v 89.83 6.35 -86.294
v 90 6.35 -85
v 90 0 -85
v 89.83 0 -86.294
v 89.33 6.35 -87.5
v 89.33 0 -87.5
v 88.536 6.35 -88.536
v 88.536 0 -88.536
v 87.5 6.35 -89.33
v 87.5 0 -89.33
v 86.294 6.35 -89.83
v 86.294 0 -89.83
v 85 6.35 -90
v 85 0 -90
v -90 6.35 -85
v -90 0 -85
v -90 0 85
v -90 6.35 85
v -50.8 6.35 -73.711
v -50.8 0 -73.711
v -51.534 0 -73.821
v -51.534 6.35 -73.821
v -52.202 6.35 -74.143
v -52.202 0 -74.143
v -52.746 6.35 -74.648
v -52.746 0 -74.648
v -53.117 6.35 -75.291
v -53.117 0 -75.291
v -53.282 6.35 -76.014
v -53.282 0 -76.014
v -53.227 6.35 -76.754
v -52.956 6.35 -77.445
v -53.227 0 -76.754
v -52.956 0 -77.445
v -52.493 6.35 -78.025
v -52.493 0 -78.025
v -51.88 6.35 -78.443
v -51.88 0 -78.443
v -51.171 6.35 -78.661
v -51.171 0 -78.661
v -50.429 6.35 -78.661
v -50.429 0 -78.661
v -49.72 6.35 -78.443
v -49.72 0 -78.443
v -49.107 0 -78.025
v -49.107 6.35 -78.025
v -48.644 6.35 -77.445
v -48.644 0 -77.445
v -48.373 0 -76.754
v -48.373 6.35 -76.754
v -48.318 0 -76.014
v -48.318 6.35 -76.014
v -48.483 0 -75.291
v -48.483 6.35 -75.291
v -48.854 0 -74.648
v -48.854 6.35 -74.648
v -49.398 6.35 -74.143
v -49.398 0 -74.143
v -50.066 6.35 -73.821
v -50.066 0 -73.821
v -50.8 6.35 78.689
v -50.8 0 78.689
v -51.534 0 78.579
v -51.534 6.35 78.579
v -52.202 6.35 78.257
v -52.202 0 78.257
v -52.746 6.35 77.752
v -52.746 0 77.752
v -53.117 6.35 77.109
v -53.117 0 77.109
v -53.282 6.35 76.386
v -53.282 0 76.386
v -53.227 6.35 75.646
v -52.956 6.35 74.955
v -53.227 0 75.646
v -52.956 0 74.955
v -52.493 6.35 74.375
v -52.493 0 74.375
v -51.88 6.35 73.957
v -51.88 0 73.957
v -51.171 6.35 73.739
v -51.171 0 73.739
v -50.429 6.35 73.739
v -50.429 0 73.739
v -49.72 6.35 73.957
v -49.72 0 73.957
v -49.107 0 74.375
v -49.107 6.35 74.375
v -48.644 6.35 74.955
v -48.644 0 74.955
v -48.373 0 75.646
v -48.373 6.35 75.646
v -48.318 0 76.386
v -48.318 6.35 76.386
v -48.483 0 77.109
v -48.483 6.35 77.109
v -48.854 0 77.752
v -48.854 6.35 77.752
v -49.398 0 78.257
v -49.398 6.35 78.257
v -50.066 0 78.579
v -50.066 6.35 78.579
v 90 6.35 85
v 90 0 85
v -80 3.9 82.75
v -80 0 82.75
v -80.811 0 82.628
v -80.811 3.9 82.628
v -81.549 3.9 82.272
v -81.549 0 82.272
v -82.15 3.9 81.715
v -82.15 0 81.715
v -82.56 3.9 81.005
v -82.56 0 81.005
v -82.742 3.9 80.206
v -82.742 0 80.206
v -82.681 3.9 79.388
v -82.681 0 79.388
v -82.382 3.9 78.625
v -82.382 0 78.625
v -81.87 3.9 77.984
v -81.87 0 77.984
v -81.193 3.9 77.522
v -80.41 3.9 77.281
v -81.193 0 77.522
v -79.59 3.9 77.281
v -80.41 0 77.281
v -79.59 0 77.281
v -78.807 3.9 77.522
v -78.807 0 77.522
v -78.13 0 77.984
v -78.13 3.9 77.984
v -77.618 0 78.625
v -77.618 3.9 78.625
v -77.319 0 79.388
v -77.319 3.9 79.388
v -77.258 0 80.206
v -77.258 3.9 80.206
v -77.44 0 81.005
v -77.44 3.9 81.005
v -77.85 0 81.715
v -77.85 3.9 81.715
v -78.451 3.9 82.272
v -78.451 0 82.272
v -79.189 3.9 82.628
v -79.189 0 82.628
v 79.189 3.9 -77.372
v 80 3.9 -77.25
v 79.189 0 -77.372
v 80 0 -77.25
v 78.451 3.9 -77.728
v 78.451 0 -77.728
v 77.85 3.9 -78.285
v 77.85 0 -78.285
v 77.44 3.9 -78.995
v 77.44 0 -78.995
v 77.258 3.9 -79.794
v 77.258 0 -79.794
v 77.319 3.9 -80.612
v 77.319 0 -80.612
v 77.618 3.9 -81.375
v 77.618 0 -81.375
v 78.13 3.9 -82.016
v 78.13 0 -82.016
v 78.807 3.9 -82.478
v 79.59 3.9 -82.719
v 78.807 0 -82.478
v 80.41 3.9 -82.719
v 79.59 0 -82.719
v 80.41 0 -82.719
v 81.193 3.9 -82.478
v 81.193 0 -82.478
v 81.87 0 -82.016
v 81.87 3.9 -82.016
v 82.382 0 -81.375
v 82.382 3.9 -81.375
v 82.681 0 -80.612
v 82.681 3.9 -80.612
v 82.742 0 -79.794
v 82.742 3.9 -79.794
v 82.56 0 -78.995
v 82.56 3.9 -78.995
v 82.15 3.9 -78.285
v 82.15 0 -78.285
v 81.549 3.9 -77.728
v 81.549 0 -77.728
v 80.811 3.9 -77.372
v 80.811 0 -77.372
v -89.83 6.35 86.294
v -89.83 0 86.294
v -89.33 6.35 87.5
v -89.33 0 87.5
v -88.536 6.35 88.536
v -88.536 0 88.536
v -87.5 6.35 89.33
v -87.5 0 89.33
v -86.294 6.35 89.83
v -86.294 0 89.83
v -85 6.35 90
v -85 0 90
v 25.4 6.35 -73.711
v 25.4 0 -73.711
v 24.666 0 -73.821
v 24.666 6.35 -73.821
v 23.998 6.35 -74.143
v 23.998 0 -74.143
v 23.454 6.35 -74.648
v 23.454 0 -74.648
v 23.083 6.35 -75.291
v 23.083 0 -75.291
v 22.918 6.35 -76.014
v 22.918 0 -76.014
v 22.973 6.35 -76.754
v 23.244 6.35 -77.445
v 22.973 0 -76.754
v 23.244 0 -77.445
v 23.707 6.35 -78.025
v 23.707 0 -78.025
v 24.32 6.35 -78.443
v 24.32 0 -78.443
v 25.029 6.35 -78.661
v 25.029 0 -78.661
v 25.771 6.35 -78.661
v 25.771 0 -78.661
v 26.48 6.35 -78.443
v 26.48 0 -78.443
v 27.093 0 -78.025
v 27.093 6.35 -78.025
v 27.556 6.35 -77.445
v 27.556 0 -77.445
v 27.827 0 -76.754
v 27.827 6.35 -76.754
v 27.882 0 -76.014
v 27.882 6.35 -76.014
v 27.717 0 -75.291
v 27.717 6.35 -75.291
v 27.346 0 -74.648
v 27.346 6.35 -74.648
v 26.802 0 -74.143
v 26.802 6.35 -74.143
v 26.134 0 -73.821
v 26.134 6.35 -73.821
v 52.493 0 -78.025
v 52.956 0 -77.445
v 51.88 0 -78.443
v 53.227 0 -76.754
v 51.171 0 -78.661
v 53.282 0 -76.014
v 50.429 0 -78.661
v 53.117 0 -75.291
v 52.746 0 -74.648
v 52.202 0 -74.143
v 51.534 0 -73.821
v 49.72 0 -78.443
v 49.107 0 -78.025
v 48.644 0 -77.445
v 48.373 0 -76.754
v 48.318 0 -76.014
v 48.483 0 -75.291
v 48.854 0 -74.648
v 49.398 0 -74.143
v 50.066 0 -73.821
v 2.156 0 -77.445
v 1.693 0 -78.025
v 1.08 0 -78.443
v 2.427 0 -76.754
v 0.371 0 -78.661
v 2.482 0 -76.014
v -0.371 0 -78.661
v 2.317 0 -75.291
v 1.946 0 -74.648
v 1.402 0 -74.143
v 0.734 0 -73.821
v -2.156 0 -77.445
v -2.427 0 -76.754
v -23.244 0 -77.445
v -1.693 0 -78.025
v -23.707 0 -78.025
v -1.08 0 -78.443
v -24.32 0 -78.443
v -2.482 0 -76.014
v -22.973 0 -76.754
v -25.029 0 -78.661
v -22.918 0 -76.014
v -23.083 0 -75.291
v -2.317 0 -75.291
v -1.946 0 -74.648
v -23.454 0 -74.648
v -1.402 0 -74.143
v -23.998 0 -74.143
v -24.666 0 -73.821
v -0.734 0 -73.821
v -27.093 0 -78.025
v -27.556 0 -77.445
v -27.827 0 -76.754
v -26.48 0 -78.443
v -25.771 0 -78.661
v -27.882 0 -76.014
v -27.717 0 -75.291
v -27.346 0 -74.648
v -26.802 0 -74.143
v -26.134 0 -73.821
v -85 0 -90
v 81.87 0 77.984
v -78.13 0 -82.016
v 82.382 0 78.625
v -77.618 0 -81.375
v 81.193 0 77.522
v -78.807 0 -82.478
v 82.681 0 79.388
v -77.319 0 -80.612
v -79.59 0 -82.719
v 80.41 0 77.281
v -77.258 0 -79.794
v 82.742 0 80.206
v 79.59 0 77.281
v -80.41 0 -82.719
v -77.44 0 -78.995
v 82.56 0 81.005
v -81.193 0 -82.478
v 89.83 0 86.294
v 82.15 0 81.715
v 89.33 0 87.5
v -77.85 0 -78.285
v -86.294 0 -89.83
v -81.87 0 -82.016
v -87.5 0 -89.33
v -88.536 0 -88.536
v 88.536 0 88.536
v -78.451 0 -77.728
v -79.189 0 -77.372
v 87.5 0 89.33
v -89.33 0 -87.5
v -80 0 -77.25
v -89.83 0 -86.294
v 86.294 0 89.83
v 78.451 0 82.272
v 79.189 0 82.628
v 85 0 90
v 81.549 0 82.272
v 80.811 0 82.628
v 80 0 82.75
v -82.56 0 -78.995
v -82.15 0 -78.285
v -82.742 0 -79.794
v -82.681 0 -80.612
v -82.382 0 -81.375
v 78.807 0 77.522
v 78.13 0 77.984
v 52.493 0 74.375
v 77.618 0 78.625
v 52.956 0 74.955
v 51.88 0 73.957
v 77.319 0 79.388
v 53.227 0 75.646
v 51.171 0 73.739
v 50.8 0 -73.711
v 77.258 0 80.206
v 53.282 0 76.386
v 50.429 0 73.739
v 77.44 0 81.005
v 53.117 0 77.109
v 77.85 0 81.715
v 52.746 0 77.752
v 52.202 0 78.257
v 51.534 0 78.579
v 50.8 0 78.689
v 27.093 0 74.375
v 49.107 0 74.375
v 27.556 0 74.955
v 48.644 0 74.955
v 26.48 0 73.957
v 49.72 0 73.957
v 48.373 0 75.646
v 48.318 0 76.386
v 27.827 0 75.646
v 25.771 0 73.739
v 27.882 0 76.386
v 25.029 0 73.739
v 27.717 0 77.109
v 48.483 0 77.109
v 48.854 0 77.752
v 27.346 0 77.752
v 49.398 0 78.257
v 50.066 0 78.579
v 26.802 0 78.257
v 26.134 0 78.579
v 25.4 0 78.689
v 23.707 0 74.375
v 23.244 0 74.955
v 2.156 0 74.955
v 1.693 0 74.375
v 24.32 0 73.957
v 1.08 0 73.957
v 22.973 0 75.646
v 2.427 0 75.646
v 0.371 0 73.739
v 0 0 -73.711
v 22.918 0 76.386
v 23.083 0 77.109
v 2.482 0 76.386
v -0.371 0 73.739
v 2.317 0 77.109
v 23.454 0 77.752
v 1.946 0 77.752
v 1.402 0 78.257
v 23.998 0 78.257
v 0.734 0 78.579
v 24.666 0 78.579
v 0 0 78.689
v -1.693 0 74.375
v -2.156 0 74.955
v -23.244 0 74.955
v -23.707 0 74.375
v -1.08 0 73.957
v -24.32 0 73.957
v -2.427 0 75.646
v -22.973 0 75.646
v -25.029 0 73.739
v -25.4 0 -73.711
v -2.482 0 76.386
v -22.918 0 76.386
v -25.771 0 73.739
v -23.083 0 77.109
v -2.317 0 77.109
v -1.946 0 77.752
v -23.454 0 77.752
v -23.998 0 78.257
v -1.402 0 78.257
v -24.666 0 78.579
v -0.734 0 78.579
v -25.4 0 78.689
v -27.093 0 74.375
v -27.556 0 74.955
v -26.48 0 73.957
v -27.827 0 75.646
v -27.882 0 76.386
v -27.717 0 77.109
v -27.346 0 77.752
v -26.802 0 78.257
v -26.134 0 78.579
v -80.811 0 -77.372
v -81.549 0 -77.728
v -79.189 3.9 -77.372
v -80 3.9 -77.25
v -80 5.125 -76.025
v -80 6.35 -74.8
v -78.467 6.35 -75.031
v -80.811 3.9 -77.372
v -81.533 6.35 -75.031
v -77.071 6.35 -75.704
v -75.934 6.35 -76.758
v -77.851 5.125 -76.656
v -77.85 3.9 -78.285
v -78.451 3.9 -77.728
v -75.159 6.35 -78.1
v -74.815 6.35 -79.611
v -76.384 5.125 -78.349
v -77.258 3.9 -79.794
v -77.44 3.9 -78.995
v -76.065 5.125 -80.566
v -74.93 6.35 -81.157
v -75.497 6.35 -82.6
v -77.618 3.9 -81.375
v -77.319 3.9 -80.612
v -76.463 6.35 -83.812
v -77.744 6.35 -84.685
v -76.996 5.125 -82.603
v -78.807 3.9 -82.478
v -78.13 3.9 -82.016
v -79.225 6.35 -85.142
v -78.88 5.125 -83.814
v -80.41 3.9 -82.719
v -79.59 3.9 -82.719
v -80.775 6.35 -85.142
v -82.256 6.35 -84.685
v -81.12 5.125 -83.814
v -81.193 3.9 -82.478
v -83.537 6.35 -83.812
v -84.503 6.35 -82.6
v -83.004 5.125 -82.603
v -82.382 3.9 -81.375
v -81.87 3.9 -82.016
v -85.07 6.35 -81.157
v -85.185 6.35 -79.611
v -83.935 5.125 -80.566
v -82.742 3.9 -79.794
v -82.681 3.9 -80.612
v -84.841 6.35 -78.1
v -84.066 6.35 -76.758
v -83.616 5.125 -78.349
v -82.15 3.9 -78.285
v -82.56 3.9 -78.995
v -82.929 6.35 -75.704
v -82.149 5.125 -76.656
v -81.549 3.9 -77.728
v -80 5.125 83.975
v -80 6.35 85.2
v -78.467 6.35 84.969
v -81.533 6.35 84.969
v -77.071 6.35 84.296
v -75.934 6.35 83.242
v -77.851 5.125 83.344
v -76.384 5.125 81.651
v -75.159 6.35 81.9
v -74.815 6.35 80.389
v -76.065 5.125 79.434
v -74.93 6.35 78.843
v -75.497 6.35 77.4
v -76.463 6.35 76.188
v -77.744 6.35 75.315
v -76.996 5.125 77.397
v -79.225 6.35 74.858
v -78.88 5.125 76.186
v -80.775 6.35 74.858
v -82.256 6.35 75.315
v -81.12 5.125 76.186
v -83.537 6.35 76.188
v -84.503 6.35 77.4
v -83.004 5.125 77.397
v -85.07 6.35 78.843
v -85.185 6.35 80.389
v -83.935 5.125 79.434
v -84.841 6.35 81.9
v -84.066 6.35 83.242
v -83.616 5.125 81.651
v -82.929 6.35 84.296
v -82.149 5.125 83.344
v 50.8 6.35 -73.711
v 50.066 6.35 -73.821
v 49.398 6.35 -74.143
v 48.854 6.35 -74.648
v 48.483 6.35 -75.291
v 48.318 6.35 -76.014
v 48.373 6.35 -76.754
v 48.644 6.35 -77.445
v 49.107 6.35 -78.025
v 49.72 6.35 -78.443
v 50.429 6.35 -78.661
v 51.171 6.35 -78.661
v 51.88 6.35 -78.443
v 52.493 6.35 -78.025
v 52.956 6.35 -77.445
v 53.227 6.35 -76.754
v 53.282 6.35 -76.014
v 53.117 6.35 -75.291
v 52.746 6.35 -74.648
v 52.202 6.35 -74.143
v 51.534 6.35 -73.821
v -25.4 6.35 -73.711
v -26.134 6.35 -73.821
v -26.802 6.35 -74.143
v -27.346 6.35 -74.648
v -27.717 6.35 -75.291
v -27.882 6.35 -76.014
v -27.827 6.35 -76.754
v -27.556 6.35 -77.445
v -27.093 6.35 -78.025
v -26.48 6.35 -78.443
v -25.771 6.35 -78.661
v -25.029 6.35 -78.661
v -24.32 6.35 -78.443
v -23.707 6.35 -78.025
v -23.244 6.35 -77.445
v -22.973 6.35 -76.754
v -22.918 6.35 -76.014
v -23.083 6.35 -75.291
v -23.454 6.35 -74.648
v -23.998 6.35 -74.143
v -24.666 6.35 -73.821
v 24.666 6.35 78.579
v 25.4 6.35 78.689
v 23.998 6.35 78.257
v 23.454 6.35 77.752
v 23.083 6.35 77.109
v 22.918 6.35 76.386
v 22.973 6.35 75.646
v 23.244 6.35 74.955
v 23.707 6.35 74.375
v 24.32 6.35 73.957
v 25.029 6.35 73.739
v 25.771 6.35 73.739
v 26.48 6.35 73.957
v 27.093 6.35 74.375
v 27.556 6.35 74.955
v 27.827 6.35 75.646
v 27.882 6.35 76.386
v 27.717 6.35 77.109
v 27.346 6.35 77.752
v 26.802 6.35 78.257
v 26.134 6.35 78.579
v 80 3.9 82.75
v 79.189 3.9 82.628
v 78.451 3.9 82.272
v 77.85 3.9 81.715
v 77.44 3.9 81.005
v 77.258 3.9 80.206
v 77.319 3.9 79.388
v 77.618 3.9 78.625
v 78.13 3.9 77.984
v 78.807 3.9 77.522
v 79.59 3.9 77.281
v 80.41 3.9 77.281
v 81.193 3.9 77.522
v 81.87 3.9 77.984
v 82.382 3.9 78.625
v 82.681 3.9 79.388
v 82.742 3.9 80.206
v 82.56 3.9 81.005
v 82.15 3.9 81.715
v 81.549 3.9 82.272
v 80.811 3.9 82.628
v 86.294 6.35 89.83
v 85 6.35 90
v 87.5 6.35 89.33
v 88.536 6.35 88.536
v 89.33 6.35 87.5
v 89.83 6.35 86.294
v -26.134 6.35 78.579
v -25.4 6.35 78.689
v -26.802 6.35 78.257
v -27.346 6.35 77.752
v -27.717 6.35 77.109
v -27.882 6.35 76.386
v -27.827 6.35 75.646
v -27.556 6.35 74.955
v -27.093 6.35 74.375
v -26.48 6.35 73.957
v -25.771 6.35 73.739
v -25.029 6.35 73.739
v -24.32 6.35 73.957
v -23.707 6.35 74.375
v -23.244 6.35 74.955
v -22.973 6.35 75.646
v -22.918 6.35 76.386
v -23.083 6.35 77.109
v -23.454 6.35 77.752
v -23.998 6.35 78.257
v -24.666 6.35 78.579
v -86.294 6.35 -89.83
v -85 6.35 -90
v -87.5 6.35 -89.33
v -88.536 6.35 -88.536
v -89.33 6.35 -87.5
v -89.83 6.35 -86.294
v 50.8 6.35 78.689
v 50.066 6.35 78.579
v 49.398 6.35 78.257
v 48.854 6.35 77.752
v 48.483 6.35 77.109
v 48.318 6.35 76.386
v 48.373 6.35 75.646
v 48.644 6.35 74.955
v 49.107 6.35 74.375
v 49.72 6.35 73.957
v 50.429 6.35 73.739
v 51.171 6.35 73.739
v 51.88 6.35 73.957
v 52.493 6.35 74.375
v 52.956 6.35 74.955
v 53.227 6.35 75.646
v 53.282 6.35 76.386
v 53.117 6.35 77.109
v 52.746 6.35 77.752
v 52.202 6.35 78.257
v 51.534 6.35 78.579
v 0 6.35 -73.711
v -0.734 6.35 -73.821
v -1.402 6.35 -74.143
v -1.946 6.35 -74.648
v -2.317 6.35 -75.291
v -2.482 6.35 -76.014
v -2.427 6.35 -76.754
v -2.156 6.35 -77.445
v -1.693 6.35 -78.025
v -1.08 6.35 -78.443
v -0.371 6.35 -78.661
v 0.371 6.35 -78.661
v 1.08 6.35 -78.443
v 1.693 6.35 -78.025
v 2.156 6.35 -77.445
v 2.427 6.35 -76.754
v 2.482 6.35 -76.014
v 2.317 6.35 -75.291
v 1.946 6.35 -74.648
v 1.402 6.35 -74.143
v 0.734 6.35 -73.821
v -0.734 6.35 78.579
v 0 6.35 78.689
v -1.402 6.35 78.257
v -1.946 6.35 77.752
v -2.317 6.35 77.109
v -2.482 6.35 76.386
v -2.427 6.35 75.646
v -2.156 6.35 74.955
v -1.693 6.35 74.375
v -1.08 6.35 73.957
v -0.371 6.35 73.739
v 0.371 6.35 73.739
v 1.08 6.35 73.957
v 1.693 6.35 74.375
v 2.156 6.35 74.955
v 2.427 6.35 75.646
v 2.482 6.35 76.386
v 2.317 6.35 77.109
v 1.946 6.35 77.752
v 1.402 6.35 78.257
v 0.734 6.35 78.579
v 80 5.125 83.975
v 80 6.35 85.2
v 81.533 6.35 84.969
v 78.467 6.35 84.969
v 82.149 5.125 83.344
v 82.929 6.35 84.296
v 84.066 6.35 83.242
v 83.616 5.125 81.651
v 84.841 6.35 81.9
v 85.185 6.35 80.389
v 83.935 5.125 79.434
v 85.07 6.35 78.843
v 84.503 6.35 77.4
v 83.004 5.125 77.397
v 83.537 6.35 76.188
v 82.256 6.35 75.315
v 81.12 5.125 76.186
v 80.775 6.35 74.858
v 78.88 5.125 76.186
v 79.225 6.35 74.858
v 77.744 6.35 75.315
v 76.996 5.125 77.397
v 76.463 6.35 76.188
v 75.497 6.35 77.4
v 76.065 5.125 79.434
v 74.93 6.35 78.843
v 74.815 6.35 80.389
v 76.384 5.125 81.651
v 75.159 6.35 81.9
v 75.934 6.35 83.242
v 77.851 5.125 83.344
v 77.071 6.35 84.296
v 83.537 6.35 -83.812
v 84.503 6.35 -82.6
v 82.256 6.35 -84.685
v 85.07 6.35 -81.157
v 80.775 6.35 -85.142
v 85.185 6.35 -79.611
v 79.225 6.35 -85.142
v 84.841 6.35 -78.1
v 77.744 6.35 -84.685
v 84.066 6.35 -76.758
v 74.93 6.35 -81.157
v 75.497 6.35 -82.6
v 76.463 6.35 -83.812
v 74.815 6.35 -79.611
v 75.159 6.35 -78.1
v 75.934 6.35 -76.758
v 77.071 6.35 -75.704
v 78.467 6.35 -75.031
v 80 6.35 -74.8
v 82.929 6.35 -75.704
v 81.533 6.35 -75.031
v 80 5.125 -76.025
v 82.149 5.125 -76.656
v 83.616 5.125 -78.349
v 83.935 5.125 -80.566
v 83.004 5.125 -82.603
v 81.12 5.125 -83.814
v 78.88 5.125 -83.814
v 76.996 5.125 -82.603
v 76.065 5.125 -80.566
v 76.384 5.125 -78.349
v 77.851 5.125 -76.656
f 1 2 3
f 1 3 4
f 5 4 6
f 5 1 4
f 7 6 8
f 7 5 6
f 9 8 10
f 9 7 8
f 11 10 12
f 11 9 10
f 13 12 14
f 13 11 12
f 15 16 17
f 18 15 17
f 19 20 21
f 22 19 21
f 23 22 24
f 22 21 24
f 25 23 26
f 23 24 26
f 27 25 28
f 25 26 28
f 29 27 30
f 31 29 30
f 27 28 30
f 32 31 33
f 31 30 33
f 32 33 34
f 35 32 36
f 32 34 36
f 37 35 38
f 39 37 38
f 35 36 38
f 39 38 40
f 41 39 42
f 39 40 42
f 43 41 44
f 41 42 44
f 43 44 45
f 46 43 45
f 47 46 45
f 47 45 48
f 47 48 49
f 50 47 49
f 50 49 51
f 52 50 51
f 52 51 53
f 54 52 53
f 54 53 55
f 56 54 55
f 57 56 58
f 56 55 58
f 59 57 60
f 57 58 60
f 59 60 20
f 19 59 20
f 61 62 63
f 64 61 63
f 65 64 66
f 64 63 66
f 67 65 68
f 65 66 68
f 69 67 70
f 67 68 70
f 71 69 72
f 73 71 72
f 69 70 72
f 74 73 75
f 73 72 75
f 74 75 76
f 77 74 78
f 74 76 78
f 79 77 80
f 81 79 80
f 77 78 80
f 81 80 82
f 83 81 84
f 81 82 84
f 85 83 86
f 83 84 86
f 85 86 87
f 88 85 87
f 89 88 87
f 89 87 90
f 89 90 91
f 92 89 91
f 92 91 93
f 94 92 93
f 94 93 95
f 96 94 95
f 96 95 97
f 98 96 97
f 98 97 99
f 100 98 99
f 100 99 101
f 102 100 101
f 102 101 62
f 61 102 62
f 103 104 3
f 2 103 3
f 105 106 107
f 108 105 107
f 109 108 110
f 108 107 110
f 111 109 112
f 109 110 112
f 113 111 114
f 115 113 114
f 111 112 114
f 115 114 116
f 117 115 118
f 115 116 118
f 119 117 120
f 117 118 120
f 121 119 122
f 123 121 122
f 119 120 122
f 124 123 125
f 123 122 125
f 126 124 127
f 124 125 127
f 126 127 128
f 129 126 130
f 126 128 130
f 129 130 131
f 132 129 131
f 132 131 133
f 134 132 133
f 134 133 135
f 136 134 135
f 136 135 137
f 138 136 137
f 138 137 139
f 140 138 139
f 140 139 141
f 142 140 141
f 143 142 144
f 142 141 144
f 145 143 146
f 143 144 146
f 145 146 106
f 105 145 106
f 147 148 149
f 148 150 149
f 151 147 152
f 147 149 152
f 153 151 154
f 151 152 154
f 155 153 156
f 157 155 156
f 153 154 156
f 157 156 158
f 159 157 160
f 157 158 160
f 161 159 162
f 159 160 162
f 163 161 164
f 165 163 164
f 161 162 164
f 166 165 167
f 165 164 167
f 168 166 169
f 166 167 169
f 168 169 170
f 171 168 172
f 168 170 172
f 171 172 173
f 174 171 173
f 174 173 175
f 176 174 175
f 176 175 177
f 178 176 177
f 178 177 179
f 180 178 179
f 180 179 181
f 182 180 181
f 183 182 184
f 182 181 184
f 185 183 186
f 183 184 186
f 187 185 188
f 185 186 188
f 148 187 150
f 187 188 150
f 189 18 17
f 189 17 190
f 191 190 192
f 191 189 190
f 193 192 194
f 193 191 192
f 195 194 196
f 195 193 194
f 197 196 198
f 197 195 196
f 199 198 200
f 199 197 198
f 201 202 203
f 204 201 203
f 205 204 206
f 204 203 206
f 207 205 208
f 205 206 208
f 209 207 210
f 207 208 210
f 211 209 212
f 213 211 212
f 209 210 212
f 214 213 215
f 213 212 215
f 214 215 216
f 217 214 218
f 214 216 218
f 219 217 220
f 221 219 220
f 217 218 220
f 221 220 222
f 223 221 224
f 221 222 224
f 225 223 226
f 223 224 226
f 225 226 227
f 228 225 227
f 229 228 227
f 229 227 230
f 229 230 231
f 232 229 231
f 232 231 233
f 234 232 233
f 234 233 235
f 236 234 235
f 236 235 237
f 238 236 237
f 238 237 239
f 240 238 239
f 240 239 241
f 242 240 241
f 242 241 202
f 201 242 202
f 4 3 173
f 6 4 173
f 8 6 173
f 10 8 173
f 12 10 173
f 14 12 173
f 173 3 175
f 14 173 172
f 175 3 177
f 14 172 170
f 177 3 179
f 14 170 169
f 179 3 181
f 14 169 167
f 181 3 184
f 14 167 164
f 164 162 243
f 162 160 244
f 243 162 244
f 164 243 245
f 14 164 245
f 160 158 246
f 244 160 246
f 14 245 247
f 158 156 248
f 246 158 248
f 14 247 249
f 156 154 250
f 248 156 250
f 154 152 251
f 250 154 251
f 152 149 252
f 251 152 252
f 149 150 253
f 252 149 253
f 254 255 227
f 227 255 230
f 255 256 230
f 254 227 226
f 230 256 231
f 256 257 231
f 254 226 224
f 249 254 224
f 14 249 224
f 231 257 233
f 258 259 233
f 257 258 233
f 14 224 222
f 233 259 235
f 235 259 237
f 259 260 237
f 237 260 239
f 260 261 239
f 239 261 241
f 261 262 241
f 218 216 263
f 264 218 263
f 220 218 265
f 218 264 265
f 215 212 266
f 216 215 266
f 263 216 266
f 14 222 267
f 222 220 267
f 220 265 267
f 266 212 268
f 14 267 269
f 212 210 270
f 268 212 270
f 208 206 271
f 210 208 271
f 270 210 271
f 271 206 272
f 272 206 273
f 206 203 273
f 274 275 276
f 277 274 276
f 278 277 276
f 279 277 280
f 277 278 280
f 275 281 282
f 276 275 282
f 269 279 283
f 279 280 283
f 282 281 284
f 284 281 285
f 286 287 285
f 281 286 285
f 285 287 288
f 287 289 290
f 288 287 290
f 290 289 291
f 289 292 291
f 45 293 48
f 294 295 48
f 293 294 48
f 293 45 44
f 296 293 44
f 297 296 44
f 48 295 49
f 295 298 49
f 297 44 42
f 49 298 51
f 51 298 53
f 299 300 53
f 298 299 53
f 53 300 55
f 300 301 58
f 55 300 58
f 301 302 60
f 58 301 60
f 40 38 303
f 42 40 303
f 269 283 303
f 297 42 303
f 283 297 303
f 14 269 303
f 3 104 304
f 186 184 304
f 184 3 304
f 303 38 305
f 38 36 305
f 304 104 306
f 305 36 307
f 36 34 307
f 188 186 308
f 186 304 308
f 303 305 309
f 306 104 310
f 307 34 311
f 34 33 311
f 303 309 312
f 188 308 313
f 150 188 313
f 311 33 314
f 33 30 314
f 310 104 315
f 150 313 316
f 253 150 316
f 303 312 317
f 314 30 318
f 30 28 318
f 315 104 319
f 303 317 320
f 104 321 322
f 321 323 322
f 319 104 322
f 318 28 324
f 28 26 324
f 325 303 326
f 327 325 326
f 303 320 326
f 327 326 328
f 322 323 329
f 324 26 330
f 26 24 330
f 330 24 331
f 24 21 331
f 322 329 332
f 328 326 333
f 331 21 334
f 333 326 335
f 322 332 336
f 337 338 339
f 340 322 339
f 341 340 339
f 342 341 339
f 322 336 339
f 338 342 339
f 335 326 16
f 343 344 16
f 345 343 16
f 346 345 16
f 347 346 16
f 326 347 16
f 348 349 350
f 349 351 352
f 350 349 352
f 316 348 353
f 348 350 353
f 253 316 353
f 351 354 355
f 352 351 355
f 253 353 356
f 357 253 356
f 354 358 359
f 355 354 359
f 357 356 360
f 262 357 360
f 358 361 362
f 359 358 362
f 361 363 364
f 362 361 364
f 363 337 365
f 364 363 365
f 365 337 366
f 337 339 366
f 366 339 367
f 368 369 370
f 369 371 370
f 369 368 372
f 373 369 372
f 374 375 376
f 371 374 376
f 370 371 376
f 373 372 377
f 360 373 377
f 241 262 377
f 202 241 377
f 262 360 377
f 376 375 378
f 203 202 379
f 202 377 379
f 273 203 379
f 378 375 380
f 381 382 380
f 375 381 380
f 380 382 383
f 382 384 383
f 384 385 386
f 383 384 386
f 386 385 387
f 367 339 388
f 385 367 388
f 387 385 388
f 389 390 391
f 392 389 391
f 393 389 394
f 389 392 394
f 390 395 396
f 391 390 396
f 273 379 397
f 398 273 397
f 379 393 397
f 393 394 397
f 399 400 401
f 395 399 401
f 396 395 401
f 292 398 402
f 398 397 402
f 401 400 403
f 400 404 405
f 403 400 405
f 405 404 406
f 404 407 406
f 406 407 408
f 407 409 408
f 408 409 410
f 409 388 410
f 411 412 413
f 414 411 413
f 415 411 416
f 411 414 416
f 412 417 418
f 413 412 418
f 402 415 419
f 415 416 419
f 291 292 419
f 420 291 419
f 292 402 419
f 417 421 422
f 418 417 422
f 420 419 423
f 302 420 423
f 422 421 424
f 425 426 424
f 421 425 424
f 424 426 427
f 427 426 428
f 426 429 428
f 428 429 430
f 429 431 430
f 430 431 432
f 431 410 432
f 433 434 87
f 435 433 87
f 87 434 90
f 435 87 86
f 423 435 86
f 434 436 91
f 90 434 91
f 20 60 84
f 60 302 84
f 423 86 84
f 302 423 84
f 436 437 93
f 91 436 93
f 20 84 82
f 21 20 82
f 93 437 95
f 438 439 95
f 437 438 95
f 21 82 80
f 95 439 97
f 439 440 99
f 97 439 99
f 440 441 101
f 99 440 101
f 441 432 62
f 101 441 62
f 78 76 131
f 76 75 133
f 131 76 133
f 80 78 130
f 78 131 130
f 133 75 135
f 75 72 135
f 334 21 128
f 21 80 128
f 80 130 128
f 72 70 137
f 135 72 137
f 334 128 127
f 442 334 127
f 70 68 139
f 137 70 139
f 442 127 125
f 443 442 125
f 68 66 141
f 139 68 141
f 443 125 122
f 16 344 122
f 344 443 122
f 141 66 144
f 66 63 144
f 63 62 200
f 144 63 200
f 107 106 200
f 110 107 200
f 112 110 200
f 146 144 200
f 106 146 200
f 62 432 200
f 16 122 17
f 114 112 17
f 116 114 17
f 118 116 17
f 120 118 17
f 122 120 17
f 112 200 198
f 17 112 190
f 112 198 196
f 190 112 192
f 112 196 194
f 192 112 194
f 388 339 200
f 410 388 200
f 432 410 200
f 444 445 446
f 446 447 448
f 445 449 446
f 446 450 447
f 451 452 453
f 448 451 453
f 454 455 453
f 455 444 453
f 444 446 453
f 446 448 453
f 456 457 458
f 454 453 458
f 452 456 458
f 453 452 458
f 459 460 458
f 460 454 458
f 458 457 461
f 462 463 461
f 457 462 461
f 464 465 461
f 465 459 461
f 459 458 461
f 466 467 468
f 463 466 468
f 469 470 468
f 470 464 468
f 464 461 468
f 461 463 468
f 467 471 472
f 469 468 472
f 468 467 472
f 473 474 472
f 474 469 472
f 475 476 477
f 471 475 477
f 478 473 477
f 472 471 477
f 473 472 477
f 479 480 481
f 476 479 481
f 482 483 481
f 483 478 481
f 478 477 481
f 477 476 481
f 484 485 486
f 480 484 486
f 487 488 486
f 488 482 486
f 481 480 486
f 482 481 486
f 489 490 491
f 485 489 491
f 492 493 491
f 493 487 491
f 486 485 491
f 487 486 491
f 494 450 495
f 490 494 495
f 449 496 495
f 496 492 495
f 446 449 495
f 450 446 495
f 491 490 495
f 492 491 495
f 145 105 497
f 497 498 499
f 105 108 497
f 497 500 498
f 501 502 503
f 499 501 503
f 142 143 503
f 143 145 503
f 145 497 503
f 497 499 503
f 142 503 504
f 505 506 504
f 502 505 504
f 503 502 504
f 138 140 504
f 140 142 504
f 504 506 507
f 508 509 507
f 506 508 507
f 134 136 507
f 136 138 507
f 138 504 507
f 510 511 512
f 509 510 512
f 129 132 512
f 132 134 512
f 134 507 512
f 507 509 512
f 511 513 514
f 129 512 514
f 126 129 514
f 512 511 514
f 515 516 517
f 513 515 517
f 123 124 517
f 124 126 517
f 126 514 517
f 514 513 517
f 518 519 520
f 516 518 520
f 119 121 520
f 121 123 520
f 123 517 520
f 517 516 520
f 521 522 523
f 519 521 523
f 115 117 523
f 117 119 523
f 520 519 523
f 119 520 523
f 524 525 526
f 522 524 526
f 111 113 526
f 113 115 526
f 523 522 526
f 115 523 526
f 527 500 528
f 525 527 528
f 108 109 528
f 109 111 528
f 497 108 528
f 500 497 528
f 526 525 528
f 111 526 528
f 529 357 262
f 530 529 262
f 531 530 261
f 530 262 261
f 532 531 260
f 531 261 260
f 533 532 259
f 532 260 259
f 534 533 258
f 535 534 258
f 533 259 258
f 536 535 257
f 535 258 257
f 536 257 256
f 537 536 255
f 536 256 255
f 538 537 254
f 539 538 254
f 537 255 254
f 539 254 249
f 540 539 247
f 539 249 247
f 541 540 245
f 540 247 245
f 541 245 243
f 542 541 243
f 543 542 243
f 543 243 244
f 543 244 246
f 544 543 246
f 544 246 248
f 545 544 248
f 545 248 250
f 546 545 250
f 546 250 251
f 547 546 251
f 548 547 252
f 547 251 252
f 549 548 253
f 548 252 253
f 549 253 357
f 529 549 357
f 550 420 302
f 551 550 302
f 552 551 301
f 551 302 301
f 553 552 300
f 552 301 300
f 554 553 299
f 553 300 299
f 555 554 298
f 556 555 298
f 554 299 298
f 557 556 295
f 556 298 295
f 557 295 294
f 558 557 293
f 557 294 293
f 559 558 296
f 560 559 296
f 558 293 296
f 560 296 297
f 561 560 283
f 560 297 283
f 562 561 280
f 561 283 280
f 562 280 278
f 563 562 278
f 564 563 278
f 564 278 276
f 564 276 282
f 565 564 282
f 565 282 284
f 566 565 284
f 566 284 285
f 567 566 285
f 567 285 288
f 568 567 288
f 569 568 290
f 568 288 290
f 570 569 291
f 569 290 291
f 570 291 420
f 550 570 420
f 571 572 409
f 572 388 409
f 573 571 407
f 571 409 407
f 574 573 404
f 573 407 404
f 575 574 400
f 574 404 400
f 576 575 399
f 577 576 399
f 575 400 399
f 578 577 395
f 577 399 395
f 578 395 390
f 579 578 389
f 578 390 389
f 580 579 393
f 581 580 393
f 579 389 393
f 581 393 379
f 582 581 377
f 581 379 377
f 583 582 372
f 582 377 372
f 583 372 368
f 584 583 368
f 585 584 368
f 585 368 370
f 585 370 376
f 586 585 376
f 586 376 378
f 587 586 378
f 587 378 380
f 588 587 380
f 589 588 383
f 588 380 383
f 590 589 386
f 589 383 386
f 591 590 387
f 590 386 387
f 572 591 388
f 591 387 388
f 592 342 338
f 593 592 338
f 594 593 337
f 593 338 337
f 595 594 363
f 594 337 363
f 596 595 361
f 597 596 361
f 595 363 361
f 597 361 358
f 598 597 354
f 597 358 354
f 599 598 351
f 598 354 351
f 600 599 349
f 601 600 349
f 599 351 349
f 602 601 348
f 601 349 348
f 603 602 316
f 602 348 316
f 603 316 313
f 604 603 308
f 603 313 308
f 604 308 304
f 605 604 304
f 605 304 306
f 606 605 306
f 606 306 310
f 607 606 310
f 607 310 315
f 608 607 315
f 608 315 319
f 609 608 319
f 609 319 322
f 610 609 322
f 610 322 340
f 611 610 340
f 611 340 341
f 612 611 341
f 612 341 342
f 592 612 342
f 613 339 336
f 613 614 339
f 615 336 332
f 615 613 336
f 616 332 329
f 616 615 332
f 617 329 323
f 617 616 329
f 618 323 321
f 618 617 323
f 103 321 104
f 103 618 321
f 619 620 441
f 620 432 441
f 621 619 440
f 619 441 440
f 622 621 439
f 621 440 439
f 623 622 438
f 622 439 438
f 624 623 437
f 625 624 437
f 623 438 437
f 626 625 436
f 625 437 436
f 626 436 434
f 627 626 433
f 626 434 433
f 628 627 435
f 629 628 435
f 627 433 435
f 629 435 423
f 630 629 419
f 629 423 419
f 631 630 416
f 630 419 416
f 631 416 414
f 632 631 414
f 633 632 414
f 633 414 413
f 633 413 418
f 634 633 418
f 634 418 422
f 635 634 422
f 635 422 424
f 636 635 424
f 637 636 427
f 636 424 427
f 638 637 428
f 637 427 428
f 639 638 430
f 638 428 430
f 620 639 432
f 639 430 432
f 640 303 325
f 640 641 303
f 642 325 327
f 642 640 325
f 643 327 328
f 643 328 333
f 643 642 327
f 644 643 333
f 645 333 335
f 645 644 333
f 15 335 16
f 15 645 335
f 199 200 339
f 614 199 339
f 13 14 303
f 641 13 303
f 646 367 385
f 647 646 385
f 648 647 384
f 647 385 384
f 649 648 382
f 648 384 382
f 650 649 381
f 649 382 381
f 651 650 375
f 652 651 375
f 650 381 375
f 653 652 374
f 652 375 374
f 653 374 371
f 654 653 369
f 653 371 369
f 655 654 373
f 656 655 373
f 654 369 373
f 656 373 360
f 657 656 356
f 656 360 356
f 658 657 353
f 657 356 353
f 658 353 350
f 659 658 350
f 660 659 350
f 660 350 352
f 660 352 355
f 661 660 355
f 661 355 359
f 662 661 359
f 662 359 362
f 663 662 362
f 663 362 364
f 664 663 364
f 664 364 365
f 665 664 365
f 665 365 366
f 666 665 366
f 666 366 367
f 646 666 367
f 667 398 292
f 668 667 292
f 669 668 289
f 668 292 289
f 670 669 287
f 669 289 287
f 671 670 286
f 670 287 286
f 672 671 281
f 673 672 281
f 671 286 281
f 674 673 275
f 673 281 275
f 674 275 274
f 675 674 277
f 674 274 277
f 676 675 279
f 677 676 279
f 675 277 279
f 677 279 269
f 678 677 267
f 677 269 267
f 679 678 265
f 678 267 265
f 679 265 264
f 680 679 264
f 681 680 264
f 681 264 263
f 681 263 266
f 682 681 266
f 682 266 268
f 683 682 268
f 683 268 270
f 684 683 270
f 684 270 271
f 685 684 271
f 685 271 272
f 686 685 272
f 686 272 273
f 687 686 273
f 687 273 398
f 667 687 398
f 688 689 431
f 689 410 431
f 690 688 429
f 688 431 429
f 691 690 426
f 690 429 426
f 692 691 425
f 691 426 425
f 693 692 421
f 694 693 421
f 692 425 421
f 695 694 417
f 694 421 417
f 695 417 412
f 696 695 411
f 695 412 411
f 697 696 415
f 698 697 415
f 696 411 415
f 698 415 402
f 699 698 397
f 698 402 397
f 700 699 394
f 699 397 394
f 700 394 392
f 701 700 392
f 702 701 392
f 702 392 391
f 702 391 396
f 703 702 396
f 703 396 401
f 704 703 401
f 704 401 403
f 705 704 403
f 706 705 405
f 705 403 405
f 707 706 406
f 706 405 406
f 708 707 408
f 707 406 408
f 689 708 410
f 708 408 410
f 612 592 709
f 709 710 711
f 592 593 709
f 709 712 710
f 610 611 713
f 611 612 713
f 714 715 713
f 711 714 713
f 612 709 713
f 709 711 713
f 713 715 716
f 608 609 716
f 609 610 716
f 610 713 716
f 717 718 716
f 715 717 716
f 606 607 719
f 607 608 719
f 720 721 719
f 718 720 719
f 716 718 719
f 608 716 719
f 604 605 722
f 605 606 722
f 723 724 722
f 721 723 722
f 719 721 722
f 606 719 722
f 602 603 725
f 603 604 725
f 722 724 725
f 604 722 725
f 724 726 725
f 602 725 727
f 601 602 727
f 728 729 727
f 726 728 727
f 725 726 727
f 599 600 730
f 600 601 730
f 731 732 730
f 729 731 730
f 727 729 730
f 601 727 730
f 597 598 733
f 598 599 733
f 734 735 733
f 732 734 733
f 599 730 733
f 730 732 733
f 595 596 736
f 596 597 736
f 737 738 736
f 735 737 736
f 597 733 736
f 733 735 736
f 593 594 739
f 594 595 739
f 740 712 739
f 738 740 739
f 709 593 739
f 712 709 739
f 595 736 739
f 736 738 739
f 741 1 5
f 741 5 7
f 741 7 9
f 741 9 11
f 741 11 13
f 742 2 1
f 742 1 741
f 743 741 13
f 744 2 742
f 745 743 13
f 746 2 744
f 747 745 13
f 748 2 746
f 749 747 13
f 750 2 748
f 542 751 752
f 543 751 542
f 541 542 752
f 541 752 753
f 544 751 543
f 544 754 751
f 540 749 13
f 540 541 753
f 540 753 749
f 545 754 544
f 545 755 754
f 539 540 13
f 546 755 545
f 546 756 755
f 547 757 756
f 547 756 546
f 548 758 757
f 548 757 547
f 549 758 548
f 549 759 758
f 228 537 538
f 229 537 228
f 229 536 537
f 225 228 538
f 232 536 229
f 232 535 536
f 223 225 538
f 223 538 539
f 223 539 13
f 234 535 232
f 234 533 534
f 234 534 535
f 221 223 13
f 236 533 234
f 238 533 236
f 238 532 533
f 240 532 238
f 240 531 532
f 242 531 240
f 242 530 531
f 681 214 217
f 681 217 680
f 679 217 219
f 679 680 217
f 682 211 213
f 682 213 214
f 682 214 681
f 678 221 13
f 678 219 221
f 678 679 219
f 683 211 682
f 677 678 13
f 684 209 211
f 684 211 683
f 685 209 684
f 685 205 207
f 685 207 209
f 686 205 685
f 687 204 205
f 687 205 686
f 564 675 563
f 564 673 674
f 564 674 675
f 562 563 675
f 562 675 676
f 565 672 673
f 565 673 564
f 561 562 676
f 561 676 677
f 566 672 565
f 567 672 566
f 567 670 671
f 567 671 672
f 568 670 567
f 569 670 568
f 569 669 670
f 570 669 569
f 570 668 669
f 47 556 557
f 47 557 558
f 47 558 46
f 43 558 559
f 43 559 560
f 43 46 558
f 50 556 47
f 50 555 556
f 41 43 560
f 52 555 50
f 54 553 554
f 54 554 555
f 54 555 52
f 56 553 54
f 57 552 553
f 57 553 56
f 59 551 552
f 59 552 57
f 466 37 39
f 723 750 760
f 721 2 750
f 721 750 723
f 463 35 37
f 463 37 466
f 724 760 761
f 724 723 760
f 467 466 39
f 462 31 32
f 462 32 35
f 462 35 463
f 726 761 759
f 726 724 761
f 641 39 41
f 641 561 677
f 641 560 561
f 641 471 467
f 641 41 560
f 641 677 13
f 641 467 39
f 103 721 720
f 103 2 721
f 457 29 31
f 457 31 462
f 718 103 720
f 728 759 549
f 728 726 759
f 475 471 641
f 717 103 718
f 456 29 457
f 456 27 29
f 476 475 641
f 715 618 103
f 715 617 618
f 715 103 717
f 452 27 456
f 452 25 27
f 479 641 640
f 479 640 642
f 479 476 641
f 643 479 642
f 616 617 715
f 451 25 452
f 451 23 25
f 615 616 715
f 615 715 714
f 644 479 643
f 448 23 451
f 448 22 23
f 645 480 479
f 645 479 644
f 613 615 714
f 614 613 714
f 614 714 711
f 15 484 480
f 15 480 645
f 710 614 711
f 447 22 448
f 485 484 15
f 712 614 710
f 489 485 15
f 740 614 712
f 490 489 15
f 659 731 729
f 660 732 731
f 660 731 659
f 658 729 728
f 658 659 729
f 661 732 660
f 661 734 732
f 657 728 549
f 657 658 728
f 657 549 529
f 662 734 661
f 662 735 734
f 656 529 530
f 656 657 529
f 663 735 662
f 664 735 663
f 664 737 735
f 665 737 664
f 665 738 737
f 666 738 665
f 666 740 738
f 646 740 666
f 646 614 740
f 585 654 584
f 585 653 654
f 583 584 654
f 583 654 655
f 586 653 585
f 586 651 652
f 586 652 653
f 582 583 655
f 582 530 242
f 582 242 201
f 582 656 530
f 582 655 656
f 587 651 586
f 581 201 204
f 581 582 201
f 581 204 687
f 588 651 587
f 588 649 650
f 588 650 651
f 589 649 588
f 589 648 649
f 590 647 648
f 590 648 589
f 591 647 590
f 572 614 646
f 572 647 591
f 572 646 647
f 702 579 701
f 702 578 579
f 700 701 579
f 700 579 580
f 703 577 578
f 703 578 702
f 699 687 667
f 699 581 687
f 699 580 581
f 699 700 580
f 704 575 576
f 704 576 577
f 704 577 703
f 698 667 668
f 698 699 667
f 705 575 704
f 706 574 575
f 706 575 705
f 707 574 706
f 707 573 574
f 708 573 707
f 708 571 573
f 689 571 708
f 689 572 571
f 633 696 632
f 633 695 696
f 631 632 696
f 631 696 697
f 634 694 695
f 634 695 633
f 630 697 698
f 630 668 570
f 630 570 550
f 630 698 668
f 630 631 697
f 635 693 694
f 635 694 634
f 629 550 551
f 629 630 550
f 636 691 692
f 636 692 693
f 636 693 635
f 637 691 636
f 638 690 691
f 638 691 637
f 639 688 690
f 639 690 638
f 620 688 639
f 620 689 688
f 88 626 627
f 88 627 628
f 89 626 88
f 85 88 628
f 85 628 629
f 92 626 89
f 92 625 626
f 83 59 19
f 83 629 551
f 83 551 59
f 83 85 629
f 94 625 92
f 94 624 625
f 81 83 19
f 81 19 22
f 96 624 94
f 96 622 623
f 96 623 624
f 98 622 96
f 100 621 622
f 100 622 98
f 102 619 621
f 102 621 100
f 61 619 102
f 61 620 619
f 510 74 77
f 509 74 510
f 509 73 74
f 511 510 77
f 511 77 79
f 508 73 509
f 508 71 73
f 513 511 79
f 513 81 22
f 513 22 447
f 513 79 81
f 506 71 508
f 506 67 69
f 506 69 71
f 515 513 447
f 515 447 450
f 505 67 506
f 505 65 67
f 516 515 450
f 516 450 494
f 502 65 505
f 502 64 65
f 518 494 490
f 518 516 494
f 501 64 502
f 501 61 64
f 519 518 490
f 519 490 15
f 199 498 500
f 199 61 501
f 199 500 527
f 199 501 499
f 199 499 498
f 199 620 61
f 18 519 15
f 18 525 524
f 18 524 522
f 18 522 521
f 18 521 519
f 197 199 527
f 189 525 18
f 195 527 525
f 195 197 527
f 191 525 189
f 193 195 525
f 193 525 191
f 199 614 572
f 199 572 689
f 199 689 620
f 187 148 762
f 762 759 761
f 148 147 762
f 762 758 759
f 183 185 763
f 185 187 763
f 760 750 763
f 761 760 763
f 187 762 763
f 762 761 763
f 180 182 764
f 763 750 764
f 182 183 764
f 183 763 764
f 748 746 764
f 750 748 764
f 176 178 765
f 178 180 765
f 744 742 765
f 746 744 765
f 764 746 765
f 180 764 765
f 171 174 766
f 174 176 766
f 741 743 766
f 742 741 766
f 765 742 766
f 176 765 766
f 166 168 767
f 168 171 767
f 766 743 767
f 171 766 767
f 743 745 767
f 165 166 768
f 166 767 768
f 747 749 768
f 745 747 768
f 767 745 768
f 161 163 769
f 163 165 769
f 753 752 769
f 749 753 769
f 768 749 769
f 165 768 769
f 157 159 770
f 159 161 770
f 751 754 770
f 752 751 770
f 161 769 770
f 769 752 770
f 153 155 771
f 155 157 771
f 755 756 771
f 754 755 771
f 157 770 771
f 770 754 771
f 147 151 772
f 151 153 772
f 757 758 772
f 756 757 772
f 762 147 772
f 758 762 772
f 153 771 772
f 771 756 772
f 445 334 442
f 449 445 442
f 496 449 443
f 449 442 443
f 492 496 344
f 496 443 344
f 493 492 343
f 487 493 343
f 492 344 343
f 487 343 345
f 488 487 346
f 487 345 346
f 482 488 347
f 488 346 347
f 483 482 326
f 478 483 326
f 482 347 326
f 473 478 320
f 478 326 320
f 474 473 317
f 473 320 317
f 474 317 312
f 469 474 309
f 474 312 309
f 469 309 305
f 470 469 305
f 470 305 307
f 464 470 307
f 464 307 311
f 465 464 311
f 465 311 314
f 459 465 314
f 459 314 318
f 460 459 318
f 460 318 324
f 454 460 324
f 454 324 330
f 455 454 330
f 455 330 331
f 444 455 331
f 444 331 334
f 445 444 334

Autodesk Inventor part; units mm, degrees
ref_plane "YZ Plane" through (0, 0, 0) normal (1, 0, 0) x (0, 1, 0)
ref_plane "XZ Plane" through (0, 0, 0) normal (0, 1, 0) x (-1, 0, 0)
ref_plane "XY Plane" through (0, 0, 0) normal (0, 0, 1) x (1, 0, 0)
sketch "Sketch1" plane through (0, 0, 0) normal (0, 1, 0) x (-1, 0, 0)
  line L0 (-90, -90) -> (90, -90)
  line L1 (90, -90) -> (90, 90)
  line L2 (90, 90) -> (-90, 90)
  line L3 (-90, 90) -> (-90, -90)
  line L4 (-90, -90) -> (90, 90) construction
  line L5 (90, -90) -> (-90, 90) construction
  point P0 (0, 0)
  dimension "d0" = 180
  dimension "d1" = 180
extrude "Extrusion1" add sketch "Sketch1" along normal blind 6.35
sketch "Sketch2" plane through (0, 6.35, 0) normal (0, 1, 0) x (1, 0, 0)
  point P0 (0, 0)
  point P1 (-80, -80)
  point P2 (-80, 80)
  point P3 (80, 80)
  point P4 (80, -80)
  dimension "d4" = 160
  dimension "d5" = 80
  dimension "d6" = 160
  dimension "d7" = 80
hole "Hole1" at (-80, 6.35, 80) at (-80, 6.35, -80) at (80, 6.35, -80) at (80, 6.35, 80) direction (0, -1, 0) diameter 5.5 end through all countersink diameter 10.4 countersink angle 90 clearance for "Flat Head Machine Screw" size "M5" standard "Ansi Metric M Profile"
sketch "Sketch3" plane through (0, 6.35, 0) normal (0, 1, 0) x (1, 0, 0)
  point P0 (0, 0)
  point P1 (-25.4, 76.2)
  point P2 (-25.4, -76.2)
  point P3 (25.4, -76.2)
  point P4 (25.4, 76.2)
  point P5 (0, -76.2)
  point P6 (0, 76.2)
  point P7 (-50.8, 76.2)
  point P8 (-50.8, -76.2)
  point P9 (50.8, -76.2)
  point P10 (50.8, 76.2)
  dimension "d15" = 152.4
  dimension "d16" = 50.8
  dimension "d17" = 76.2
  dimension "d18" = 25.4
  dimension "d27" = 25.4
  dimension "d28" = 25.4
hole "Hole2" at (-25.4, 6.35, -76.2) at (-25.4, 6.35, 76.2) at (25.4, 6.35, 76.2) at (25.4, 6.35, -76.2) at (0, 6.35, 76.2) at (-50.8, 6.35, 76.2) at (50.8, 6.35, 76.2) at (50.8, 6.35, -76.2) at (0, 6.35, -76.2) at (-50.8, 6.35, -76.2) direction (0, -1, 0) diameter 4.9784 end through all thread size "1/4-20 UNC" class "2B" standard "ANSI Unified Screw Threads"
fillet "Fillet1" radius 5 4 edges at (90, 3.175, 90) (90, 3.175, -90) (-90, 3.175, -90) (-90, 3.175, 90)
equation "\"d5\" = 0.5 * d4"
equation "\"d7\" = 0.5 * d6"
equation "\"d17\" = 0.5 * d15"
equation "\"d18\" = 0.5 * d16"
properties part number "Chuck Adapter Plate"
